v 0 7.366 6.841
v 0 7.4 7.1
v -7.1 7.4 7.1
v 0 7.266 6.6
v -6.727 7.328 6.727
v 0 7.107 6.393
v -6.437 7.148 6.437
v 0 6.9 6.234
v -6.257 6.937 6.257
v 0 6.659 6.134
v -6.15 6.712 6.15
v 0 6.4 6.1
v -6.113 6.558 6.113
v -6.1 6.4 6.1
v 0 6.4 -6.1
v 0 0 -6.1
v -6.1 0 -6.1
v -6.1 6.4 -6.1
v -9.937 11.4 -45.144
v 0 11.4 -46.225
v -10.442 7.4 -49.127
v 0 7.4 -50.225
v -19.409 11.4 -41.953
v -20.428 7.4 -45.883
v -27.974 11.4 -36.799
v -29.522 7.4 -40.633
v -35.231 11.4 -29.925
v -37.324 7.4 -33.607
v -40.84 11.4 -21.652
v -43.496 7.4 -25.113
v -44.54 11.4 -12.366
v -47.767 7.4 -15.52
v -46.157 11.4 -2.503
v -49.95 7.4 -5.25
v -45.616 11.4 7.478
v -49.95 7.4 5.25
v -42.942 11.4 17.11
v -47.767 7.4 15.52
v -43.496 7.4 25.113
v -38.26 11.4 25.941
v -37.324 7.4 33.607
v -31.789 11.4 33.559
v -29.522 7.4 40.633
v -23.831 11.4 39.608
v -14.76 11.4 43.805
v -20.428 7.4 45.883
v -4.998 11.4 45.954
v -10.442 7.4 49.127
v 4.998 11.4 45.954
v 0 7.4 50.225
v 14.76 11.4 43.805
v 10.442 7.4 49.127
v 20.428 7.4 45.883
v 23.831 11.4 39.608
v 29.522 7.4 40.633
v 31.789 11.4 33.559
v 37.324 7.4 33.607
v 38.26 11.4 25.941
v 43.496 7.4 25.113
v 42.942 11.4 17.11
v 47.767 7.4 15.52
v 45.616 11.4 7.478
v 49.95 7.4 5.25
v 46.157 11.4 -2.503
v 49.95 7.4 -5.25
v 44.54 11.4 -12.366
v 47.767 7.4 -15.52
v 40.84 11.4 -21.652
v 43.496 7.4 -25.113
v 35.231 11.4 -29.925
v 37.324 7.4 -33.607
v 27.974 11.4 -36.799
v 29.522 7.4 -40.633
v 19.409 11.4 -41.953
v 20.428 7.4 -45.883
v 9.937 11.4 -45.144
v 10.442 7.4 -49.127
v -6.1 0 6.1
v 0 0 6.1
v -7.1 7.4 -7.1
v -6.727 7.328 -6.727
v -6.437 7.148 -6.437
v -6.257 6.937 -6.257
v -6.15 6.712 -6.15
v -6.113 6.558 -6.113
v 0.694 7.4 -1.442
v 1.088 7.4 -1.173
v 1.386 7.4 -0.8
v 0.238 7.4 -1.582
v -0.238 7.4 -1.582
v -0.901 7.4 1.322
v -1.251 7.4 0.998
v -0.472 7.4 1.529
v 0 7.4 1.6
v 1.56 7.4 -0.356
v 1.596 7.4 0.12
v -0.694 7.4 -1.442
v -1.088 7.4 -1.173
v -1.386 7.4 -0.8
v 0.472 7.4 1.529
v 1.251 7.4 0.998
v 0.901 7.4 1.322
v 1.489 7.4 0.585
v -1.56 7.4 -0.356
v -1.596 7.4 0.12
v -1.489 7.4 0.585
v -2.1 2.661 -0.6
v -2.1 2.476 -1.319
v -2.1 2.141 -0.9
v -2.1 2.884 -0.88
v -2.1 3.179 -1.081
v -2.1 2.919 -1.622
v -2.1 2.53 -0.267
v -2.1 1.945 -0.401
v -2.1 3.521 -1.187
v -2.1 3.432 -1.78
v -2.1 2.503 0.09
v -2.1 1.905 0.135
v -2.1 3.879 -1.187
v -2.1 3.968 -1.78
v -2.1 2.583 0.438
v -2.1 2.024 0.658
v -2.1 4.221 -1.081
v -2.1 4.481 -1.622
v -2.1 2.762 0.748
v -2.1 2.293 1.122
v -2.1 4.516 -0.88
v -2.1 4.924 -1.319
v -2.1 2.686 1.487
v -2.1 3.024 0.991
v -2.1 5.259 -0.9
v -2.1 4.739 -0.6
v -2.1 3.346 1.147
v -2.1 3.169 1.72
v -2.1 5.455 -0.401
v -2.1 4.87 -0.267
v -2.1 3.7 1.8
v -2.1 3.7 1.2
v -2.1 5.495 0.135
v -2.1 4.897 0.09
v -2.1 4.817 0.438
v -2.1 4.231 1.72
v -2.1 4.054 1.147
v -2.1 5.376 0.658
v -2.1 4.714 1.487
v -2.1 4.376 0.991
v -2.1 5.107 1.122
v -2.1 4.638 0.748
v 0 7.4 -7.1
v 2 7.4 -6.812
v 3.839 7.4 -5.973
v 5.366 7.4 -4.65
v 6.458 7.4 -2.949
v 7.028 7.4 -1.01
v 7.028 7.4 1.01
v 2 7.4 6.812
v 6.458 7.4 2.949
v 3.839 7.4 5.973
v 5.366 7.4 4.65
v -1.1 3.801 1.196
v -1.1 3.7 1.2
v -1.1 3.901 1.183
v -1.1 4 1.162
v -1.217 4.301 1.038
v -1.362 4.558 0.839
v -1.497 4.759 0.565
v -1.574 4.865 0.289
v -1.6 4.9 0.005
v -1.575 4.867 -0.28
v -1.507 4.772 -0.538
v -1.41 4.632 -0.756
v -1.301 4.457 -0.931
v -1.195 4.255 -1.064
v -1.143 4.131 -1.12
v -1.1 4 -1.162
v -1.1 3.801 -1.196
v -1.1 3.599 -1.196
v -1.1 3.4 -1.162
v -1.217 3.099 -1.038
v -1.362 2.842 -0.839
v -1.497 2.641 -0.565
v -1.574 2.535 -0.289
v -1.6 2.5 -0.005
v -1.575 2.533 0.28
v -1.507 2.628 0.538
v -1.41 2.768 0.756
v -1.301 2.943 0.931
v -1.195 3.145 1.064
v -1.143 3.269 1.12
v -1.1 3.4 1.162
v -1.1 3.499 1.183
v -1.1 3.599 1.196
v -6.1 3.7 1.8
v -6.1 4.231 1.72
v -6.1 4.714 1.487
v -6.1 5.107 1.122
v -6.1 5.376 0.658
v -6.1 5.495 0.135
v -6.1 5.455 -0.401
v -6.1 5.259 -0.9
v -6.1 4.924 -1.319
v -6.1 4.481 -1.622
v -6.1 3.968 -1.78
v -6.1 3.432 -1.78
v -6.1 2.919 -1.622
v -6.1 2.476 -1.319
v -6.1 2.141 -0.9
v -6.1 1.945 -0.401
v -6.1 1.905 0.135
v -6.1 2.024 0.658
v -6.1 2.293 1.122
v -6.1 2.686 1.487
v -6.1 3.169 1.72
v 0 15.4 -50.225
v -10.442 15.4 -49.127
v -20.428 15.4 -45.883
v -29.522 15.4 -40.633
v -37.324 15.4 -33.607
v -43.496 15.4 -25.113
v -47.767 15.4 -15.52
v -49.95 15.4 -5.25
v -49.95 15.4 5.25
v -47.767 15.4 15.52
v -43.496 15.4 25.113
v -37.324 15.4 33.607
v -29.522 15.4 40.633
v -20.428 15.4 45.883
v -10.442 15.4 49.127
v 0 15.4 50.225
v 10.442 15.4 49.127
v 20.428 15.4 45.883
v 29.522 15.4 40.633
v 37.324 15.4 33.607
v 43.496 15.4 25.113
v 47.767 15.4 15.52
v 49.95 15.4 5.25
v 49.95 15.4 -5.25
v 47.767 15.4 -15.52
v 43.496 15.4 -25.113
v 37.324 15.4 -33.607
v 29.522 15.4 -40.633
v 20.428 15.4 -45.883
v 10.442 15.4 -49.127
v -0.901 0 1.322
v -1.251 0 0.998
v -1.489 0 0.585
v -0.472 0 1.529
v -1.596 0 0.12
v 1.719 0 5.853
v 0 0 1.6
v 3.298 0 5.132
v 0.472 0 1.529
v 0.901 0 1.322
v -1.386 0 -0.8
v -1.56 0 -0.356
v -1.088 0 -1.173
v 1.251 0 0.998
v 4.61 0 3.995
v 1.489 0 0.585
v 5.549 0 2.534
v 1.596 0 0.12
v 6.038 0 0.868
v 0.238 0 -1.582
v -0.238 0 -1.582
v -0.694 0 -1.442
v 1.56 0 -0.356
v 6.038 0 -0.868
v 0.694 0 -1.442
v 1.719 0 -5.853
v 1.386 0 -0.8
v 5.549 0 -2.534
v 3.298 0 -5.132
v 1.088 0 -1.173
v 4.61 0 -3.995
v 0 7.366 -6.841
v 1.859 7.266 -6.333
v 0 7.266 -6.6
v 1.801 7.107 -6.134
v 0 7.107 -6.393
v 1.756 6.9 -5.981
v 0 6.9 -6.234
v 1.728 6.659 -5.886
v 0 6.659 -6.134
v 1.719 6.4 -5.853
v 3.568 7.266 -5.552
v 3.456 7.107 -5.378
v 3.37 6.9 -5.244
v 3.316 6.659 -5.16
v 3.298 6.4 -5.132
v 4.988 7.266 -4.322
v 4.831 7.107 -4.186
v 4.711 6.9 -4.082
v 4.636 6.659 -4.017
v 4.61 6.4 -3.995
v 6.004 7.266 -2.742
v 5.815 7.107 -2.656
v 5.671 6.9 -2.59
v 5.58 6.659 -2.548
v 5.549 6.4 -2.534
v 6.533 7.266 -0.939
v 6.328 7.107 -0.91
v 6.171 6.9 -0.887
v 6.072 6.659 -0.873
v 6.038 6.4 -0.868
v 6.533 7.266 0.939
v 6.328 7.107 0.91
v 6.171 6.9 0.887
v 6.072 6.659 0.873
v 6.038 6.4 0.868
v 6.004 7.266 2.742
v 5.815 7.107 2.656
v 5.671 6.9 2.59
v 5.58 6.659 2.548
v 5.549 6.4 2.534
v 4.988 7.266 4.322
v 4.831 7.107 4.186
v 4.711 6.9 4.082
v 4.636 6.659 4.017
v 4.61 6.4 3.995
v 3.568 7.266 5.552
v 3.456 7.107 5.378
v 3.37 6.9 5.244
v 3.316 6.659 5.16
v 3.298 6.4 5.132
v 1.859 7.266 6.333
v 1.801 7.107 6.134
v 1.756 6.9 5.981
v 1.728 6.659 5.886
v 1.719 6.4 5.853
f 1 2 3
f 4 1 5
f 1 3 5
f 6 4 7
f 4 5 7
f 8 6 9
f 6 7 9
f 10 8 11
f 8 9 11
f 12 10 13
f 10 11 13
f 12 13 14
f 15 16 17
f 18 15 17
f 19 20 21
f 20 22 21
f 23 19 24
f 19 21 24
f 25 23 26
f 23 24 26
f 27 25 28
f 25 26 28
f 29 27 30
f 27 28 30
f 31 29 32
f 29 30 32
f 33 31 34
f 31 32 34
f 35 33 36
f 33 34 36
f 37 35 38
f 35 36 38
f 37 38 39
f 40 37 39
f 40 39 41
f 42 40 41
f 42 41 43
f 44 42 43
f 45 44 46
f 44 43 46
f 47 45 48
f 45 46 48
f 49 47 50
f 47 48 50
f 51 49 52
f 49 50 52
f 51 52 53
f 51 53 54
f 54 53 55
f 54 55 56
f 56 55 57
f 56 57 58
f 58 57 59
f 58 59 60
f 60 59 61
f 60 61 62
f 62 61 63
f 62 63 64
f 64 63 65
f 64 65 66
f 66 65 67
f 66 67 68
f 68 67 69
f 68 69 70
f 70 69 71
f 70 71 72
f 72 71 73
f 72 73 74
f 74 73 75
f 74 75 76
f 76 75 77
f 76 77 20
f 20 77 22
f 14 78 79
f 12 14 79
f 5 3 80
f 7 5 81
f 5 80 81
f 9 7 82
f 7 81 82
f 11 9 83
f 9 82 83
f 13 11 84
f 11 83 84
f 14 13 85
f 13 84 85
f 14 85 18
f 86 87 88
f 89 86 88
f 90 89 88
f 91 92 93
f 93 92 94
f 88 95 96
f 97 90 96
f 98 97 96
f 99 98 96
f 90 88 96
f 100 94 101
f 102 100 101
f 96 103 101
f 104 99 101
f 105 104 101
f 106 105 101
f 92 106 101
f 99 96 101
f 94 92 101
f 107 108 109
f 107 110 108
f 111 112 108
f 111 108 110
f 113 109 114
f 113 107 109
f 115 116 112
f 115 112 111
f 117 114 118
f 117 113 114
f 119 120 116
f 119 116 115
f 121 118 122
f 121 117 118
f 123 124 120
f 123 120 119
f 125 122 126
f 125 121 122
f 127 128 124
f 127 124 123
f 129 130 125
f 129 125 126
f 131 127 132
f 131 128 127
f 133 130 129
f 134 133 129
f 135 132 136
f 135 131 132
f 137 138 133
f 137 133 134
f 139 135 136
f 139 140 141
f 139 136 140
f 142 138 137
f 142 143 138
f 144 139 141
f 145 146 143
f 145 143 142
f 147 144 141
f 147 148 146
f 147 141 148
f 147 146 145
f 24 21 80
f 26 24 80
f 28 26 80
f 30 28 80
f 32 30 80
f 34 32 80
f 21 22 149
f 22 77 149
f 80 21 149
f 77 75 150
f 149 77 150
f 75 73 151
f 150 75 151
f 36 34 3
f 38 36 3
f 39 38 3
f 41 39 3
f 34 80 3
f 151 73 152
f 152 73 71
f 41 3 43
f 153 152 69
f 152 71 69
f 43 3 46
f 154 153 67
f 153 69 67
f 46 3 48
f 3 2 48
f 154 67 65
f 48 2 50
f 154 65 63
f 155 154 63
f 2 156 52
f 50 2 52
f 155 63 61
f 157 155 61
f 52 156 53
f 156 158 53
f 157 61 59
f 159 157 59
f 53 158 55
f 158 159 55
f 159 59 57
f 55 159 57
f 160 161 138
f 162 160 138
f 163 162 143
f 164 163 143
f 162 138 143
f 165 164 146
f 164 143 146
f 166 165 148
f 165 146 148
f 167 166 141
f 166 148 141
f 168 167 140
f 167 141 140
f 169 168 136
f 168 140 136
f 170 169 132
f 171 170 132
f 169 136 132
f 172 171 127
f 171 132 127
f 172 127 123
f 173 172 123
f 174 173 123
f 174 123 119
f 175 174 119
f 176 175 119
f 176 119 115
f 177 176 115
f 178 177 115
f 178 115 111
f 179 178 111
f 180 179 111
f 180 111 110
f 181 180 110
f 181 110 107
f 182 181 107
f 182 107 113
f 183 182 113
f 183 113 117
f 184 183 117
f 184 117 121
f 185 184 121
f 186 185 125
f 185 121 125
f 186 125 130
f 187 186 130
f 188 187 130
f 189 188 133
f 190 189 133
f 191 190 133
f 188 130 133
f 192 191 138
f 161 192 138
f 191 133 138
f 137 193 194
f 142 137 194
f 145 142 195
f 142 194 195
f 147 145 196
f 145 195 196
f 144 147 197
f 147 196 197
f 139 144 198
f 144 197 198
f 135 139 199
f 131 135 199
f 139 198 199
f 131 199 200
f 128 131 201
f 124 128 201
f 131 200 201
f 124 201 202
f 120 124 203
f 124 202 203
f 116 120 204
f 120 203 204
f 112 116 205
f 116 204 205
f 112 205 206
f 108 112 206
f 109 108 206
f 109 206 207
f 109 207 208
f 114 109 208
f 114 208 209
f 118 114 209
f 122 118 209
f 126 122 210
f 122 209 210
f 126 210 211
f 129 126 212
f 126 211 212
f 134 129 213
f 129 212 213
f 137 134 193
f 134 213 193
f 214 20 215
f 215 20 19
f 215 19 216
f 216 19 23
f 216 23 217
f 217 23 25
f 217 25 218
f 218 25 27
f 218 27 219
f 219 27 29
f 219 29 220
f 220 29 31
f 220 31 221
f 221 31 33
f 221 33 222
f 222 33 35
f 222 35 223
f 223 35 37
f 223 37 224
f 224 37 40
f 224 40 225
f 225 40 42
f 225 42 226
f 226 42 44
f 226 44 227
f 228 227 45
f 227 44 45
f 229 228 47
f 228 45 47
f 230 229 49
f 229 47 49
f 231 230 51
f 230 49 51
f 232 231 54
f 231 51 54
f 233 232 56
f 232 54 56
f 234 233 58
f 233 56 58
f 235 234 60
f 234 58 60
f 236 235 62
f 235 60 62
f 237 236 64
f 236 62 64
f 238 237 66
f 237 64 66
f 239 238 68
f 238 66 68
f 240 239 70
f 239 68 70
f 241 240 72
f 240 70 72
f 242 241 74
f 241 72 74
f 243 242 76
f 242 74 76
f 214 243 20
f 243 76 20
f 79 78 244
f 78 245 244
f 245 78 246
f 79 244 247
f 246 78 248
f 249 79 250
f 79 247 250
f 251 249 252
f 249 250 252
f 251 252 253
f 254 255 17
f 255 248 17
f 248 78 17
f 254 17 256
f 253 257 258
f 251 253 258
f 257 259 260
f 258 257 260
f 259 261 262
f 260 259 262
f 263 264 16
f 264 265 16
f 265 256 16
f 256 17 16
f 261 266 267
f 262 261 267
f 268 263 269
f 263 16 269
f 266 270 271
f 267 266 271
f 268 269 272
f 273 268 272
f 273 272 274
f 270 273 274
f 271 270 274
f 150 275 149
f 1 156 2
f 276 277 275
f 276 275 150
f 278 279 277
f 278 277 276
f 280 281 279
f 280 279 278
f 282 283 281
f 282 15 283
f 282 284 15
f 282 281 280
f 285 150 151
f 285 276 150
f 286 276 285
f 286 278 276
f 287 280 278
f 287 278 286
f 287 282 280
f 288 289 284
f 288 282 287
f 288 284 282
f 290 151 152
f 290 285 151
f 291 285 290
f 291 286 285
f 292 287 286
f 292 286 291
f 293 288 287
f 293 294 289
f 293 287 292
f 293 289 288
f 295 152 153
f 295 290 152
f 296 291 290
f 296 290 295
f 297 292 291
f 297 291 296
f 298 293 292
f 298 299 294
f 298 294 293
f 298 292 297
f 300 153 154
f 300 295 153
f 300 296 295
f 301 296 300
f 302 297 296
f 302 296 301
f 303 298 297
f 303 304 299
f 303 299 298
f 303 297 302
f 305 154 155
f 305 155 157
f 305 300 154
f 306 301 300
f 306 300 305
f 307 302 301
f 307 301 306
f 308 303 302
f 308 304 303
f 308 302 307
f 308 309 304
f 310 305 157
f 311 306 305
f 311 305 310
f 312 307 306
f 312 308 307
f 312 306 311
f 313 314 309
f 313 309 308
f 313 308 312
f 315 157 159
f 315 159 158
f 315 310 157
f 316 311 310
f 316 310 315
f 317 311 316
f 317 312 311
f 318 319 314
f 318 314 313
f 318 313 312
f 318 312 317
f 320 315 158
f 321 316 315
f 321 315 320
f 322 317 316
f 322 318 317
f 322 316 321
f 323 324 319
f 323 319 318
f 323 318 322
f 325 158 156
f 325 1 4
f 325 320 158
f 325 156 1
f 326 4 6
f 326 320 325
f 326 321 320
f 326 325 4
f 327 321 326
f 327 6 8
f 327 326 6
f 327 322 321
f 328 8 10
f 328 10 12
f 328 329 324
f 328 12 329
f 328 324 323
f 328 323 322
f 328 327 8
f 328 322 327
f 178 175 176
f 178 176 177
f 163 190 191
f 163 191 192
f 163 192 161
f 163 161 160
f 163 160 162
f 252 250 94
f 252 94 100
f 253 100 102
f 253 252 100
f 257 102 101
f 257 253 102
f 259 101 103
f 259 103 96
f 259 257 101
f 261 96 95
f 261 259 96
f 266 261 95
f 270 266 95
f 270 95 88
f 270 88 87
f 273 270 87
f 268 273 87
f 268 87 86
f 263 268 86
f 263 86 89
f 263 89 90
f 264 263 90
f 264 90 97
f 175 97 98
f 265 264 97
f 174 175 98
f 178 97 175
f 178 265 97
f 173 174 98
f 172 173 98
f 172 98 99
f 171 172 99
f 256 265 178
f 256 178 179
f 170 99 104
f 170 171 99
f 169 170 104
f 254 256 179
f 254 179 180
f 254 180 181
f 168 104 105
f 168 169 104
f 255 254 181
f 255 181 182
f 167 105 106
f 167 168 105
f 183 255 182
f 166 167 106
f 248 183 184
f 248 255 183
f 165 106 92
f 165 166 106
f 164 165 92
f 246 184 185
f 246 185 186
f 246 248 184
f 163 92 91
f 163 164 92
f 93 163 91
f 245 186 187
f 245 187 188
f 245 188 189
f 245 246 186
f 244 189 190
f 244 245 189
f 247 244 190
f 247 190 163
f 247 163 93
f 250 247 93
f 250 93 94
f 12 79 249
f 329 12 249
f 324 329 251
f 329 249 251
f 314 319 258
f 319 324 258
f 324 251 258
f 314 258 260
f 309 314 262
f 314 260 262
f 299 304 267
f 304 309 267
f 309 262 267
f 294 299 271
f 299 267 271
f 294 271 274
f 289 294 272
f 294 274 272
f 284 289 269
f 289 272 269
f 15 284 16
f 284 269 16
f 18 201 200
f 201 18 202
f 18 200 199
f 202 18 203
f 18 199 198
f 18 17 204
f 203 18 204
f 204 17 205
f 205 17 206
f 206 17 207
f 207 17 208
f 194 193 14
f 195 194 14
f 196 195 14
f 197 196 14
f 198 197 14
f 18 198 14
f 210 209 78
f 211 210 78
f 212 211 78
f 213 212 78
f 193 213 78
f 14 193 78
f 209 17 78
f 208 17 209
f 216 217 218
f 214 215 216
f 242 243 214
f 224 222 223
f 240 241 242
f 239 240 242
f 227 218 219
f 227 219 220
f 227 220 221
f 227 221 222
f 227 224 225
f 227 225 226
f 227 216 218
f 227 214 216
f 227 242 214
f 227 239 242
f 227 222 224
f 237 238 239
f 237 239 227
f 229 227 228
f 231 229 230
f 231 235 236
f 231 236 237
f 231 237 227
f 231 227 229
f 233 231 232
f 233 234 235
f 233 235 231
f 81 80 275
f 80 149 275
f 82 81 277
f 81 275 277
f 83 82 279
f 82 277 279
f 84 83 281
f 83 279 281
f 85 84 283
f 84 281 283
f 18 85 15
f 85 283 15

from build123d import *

# Parameters (mm, degrees)
SKETCH1_R           = 6.1
SKETCH1_R_2         = 1.6
BOSS_EXTRUDE1_DEPTH = 7.4
SKETCH2_R           = 1.8
CUT_EXTRUDE2_DEPTH  = 4
SKETCH3_R           = 1.2
CUT_EXTRUDE3_DEPTH  = 1
SKETCH4_R           = 52.225
BOSS_EXTRUDE2_DEPTH = 8
FILLET1_R           = 1


with BuildPart() as part:
    # Sketch1 → Boss-Extrude1 (new body)
    # profile 1 of 3: a face of its own
    with BuildSketch(Plane(origin=(0, 0, 0), x_dir=(1, 0, 0), z_dir=(0, 1, 0))):
        Circle(SKETCH1_R)
        with Locations(Location((0, 0, 0), (0, 0, 270))):
            Circle(SKETCH1_R_2, mode=Mode.SUBTRACT)
    # profile 2 of 3: a face of its own
    with BuildSketch(Plane(origin=(0, 0, 0), x_dir=(1, 0, 0), z_dir=(0, 1, 0))):
        with BuildLine():
            ThreePointArc((0, -6.1), (-4.313351365, -4.313351365), (-6.1, 0))
            Line((-6.1, 0), (-6.1, -6.1))
            Line((-6.1, -6.1), (0, -6.1))
        make_face()
    # profile 3 of 3: a face of its own
    with BuildSketch(Plane(origin=(0, 0, 0), x_dir=(1, 0, 0), z_dir=(0, 1, 0))):
        with BuildLine():
            ThreePointArc((-6.1, 0), (-4.313351365, 4.313351365), (0, 6.1))
            Line((0, 6.1), (-6.1, 6.1))
            Line((-6.1, 6.1), (-6.1, 0))
        make_face()
    extrude(amount=BOSS_EXTRUDE1_DEPTH)

    # Sketch2 → Cut-Extrude2 (cut)
    with BuildSketch(Plane.ZY.offset(6.1)):
        with Locations((0, 3.7)):
            Circle(SKETCH2_R)
    extrude(amount=-CUT_EXTRUDE2_DEPTH, mode=Mode.SUBTRACT)

    # Sketch3 → Cut-Extrude3 (cut)
    with BuildSketch(Plane.ZY.offset(2.1)):
        with Locations((0, 3.7)):
            Circle(SKETCH3_R)
    extrude(amount=-CUT_EXTRUDE3_DEPTH, mode=Mode.SUBTRACT)

    # Sketch4 → Boss-Extrude2 (add)
    with BuildSketch(Plane(origin=(0, 7.4, 0), x_dir=(1, 0, 0), z_dir=(0, 1, 0))):
        with Locations(Location((0, 0, 0), (0, 0, 270))):
            Circle(SKETCH4_R)
    extrude(amount=BOSS_EXTRUDE2_DEPTH)

    # Sketch6 → Cut-Revolve1 (revolve, cut)
    with BuildSketch(Plane(origin=(0, 0, 0), x_dir=(0, 0, -1), z_dir=(1, 0, 0)), mode=Mode.PRIVATE) as cut_revolve1_sk:
        Polygon((-46.225, 11.4), (-50.225, 7.4), (-52.225, 7.4), (-52.225, 15.4), (-50.225, 15.4), align=None)
    revolve(cut_revolve1_sk.sketch.rotate(Axis((0, 0, 0), (0, 1, 0)), 180), axis=Axis((0, 0, 0), (0, 1, 0)), mode=Mode.SUBTRACT)

    # Fillet1
    fillet1_edges = [part.edges().sort_by_distance(p)[0] for p in [
        (6.1, 7.4, 0),
        (-3.05, 7.4, -6.1),
        (-6.1, 7.4, 0),
        (-3.05, 7.4, 6.1),
    ]]
    fillet(fillet1_edges, radius=FILLET1_R)


solid = part.part
